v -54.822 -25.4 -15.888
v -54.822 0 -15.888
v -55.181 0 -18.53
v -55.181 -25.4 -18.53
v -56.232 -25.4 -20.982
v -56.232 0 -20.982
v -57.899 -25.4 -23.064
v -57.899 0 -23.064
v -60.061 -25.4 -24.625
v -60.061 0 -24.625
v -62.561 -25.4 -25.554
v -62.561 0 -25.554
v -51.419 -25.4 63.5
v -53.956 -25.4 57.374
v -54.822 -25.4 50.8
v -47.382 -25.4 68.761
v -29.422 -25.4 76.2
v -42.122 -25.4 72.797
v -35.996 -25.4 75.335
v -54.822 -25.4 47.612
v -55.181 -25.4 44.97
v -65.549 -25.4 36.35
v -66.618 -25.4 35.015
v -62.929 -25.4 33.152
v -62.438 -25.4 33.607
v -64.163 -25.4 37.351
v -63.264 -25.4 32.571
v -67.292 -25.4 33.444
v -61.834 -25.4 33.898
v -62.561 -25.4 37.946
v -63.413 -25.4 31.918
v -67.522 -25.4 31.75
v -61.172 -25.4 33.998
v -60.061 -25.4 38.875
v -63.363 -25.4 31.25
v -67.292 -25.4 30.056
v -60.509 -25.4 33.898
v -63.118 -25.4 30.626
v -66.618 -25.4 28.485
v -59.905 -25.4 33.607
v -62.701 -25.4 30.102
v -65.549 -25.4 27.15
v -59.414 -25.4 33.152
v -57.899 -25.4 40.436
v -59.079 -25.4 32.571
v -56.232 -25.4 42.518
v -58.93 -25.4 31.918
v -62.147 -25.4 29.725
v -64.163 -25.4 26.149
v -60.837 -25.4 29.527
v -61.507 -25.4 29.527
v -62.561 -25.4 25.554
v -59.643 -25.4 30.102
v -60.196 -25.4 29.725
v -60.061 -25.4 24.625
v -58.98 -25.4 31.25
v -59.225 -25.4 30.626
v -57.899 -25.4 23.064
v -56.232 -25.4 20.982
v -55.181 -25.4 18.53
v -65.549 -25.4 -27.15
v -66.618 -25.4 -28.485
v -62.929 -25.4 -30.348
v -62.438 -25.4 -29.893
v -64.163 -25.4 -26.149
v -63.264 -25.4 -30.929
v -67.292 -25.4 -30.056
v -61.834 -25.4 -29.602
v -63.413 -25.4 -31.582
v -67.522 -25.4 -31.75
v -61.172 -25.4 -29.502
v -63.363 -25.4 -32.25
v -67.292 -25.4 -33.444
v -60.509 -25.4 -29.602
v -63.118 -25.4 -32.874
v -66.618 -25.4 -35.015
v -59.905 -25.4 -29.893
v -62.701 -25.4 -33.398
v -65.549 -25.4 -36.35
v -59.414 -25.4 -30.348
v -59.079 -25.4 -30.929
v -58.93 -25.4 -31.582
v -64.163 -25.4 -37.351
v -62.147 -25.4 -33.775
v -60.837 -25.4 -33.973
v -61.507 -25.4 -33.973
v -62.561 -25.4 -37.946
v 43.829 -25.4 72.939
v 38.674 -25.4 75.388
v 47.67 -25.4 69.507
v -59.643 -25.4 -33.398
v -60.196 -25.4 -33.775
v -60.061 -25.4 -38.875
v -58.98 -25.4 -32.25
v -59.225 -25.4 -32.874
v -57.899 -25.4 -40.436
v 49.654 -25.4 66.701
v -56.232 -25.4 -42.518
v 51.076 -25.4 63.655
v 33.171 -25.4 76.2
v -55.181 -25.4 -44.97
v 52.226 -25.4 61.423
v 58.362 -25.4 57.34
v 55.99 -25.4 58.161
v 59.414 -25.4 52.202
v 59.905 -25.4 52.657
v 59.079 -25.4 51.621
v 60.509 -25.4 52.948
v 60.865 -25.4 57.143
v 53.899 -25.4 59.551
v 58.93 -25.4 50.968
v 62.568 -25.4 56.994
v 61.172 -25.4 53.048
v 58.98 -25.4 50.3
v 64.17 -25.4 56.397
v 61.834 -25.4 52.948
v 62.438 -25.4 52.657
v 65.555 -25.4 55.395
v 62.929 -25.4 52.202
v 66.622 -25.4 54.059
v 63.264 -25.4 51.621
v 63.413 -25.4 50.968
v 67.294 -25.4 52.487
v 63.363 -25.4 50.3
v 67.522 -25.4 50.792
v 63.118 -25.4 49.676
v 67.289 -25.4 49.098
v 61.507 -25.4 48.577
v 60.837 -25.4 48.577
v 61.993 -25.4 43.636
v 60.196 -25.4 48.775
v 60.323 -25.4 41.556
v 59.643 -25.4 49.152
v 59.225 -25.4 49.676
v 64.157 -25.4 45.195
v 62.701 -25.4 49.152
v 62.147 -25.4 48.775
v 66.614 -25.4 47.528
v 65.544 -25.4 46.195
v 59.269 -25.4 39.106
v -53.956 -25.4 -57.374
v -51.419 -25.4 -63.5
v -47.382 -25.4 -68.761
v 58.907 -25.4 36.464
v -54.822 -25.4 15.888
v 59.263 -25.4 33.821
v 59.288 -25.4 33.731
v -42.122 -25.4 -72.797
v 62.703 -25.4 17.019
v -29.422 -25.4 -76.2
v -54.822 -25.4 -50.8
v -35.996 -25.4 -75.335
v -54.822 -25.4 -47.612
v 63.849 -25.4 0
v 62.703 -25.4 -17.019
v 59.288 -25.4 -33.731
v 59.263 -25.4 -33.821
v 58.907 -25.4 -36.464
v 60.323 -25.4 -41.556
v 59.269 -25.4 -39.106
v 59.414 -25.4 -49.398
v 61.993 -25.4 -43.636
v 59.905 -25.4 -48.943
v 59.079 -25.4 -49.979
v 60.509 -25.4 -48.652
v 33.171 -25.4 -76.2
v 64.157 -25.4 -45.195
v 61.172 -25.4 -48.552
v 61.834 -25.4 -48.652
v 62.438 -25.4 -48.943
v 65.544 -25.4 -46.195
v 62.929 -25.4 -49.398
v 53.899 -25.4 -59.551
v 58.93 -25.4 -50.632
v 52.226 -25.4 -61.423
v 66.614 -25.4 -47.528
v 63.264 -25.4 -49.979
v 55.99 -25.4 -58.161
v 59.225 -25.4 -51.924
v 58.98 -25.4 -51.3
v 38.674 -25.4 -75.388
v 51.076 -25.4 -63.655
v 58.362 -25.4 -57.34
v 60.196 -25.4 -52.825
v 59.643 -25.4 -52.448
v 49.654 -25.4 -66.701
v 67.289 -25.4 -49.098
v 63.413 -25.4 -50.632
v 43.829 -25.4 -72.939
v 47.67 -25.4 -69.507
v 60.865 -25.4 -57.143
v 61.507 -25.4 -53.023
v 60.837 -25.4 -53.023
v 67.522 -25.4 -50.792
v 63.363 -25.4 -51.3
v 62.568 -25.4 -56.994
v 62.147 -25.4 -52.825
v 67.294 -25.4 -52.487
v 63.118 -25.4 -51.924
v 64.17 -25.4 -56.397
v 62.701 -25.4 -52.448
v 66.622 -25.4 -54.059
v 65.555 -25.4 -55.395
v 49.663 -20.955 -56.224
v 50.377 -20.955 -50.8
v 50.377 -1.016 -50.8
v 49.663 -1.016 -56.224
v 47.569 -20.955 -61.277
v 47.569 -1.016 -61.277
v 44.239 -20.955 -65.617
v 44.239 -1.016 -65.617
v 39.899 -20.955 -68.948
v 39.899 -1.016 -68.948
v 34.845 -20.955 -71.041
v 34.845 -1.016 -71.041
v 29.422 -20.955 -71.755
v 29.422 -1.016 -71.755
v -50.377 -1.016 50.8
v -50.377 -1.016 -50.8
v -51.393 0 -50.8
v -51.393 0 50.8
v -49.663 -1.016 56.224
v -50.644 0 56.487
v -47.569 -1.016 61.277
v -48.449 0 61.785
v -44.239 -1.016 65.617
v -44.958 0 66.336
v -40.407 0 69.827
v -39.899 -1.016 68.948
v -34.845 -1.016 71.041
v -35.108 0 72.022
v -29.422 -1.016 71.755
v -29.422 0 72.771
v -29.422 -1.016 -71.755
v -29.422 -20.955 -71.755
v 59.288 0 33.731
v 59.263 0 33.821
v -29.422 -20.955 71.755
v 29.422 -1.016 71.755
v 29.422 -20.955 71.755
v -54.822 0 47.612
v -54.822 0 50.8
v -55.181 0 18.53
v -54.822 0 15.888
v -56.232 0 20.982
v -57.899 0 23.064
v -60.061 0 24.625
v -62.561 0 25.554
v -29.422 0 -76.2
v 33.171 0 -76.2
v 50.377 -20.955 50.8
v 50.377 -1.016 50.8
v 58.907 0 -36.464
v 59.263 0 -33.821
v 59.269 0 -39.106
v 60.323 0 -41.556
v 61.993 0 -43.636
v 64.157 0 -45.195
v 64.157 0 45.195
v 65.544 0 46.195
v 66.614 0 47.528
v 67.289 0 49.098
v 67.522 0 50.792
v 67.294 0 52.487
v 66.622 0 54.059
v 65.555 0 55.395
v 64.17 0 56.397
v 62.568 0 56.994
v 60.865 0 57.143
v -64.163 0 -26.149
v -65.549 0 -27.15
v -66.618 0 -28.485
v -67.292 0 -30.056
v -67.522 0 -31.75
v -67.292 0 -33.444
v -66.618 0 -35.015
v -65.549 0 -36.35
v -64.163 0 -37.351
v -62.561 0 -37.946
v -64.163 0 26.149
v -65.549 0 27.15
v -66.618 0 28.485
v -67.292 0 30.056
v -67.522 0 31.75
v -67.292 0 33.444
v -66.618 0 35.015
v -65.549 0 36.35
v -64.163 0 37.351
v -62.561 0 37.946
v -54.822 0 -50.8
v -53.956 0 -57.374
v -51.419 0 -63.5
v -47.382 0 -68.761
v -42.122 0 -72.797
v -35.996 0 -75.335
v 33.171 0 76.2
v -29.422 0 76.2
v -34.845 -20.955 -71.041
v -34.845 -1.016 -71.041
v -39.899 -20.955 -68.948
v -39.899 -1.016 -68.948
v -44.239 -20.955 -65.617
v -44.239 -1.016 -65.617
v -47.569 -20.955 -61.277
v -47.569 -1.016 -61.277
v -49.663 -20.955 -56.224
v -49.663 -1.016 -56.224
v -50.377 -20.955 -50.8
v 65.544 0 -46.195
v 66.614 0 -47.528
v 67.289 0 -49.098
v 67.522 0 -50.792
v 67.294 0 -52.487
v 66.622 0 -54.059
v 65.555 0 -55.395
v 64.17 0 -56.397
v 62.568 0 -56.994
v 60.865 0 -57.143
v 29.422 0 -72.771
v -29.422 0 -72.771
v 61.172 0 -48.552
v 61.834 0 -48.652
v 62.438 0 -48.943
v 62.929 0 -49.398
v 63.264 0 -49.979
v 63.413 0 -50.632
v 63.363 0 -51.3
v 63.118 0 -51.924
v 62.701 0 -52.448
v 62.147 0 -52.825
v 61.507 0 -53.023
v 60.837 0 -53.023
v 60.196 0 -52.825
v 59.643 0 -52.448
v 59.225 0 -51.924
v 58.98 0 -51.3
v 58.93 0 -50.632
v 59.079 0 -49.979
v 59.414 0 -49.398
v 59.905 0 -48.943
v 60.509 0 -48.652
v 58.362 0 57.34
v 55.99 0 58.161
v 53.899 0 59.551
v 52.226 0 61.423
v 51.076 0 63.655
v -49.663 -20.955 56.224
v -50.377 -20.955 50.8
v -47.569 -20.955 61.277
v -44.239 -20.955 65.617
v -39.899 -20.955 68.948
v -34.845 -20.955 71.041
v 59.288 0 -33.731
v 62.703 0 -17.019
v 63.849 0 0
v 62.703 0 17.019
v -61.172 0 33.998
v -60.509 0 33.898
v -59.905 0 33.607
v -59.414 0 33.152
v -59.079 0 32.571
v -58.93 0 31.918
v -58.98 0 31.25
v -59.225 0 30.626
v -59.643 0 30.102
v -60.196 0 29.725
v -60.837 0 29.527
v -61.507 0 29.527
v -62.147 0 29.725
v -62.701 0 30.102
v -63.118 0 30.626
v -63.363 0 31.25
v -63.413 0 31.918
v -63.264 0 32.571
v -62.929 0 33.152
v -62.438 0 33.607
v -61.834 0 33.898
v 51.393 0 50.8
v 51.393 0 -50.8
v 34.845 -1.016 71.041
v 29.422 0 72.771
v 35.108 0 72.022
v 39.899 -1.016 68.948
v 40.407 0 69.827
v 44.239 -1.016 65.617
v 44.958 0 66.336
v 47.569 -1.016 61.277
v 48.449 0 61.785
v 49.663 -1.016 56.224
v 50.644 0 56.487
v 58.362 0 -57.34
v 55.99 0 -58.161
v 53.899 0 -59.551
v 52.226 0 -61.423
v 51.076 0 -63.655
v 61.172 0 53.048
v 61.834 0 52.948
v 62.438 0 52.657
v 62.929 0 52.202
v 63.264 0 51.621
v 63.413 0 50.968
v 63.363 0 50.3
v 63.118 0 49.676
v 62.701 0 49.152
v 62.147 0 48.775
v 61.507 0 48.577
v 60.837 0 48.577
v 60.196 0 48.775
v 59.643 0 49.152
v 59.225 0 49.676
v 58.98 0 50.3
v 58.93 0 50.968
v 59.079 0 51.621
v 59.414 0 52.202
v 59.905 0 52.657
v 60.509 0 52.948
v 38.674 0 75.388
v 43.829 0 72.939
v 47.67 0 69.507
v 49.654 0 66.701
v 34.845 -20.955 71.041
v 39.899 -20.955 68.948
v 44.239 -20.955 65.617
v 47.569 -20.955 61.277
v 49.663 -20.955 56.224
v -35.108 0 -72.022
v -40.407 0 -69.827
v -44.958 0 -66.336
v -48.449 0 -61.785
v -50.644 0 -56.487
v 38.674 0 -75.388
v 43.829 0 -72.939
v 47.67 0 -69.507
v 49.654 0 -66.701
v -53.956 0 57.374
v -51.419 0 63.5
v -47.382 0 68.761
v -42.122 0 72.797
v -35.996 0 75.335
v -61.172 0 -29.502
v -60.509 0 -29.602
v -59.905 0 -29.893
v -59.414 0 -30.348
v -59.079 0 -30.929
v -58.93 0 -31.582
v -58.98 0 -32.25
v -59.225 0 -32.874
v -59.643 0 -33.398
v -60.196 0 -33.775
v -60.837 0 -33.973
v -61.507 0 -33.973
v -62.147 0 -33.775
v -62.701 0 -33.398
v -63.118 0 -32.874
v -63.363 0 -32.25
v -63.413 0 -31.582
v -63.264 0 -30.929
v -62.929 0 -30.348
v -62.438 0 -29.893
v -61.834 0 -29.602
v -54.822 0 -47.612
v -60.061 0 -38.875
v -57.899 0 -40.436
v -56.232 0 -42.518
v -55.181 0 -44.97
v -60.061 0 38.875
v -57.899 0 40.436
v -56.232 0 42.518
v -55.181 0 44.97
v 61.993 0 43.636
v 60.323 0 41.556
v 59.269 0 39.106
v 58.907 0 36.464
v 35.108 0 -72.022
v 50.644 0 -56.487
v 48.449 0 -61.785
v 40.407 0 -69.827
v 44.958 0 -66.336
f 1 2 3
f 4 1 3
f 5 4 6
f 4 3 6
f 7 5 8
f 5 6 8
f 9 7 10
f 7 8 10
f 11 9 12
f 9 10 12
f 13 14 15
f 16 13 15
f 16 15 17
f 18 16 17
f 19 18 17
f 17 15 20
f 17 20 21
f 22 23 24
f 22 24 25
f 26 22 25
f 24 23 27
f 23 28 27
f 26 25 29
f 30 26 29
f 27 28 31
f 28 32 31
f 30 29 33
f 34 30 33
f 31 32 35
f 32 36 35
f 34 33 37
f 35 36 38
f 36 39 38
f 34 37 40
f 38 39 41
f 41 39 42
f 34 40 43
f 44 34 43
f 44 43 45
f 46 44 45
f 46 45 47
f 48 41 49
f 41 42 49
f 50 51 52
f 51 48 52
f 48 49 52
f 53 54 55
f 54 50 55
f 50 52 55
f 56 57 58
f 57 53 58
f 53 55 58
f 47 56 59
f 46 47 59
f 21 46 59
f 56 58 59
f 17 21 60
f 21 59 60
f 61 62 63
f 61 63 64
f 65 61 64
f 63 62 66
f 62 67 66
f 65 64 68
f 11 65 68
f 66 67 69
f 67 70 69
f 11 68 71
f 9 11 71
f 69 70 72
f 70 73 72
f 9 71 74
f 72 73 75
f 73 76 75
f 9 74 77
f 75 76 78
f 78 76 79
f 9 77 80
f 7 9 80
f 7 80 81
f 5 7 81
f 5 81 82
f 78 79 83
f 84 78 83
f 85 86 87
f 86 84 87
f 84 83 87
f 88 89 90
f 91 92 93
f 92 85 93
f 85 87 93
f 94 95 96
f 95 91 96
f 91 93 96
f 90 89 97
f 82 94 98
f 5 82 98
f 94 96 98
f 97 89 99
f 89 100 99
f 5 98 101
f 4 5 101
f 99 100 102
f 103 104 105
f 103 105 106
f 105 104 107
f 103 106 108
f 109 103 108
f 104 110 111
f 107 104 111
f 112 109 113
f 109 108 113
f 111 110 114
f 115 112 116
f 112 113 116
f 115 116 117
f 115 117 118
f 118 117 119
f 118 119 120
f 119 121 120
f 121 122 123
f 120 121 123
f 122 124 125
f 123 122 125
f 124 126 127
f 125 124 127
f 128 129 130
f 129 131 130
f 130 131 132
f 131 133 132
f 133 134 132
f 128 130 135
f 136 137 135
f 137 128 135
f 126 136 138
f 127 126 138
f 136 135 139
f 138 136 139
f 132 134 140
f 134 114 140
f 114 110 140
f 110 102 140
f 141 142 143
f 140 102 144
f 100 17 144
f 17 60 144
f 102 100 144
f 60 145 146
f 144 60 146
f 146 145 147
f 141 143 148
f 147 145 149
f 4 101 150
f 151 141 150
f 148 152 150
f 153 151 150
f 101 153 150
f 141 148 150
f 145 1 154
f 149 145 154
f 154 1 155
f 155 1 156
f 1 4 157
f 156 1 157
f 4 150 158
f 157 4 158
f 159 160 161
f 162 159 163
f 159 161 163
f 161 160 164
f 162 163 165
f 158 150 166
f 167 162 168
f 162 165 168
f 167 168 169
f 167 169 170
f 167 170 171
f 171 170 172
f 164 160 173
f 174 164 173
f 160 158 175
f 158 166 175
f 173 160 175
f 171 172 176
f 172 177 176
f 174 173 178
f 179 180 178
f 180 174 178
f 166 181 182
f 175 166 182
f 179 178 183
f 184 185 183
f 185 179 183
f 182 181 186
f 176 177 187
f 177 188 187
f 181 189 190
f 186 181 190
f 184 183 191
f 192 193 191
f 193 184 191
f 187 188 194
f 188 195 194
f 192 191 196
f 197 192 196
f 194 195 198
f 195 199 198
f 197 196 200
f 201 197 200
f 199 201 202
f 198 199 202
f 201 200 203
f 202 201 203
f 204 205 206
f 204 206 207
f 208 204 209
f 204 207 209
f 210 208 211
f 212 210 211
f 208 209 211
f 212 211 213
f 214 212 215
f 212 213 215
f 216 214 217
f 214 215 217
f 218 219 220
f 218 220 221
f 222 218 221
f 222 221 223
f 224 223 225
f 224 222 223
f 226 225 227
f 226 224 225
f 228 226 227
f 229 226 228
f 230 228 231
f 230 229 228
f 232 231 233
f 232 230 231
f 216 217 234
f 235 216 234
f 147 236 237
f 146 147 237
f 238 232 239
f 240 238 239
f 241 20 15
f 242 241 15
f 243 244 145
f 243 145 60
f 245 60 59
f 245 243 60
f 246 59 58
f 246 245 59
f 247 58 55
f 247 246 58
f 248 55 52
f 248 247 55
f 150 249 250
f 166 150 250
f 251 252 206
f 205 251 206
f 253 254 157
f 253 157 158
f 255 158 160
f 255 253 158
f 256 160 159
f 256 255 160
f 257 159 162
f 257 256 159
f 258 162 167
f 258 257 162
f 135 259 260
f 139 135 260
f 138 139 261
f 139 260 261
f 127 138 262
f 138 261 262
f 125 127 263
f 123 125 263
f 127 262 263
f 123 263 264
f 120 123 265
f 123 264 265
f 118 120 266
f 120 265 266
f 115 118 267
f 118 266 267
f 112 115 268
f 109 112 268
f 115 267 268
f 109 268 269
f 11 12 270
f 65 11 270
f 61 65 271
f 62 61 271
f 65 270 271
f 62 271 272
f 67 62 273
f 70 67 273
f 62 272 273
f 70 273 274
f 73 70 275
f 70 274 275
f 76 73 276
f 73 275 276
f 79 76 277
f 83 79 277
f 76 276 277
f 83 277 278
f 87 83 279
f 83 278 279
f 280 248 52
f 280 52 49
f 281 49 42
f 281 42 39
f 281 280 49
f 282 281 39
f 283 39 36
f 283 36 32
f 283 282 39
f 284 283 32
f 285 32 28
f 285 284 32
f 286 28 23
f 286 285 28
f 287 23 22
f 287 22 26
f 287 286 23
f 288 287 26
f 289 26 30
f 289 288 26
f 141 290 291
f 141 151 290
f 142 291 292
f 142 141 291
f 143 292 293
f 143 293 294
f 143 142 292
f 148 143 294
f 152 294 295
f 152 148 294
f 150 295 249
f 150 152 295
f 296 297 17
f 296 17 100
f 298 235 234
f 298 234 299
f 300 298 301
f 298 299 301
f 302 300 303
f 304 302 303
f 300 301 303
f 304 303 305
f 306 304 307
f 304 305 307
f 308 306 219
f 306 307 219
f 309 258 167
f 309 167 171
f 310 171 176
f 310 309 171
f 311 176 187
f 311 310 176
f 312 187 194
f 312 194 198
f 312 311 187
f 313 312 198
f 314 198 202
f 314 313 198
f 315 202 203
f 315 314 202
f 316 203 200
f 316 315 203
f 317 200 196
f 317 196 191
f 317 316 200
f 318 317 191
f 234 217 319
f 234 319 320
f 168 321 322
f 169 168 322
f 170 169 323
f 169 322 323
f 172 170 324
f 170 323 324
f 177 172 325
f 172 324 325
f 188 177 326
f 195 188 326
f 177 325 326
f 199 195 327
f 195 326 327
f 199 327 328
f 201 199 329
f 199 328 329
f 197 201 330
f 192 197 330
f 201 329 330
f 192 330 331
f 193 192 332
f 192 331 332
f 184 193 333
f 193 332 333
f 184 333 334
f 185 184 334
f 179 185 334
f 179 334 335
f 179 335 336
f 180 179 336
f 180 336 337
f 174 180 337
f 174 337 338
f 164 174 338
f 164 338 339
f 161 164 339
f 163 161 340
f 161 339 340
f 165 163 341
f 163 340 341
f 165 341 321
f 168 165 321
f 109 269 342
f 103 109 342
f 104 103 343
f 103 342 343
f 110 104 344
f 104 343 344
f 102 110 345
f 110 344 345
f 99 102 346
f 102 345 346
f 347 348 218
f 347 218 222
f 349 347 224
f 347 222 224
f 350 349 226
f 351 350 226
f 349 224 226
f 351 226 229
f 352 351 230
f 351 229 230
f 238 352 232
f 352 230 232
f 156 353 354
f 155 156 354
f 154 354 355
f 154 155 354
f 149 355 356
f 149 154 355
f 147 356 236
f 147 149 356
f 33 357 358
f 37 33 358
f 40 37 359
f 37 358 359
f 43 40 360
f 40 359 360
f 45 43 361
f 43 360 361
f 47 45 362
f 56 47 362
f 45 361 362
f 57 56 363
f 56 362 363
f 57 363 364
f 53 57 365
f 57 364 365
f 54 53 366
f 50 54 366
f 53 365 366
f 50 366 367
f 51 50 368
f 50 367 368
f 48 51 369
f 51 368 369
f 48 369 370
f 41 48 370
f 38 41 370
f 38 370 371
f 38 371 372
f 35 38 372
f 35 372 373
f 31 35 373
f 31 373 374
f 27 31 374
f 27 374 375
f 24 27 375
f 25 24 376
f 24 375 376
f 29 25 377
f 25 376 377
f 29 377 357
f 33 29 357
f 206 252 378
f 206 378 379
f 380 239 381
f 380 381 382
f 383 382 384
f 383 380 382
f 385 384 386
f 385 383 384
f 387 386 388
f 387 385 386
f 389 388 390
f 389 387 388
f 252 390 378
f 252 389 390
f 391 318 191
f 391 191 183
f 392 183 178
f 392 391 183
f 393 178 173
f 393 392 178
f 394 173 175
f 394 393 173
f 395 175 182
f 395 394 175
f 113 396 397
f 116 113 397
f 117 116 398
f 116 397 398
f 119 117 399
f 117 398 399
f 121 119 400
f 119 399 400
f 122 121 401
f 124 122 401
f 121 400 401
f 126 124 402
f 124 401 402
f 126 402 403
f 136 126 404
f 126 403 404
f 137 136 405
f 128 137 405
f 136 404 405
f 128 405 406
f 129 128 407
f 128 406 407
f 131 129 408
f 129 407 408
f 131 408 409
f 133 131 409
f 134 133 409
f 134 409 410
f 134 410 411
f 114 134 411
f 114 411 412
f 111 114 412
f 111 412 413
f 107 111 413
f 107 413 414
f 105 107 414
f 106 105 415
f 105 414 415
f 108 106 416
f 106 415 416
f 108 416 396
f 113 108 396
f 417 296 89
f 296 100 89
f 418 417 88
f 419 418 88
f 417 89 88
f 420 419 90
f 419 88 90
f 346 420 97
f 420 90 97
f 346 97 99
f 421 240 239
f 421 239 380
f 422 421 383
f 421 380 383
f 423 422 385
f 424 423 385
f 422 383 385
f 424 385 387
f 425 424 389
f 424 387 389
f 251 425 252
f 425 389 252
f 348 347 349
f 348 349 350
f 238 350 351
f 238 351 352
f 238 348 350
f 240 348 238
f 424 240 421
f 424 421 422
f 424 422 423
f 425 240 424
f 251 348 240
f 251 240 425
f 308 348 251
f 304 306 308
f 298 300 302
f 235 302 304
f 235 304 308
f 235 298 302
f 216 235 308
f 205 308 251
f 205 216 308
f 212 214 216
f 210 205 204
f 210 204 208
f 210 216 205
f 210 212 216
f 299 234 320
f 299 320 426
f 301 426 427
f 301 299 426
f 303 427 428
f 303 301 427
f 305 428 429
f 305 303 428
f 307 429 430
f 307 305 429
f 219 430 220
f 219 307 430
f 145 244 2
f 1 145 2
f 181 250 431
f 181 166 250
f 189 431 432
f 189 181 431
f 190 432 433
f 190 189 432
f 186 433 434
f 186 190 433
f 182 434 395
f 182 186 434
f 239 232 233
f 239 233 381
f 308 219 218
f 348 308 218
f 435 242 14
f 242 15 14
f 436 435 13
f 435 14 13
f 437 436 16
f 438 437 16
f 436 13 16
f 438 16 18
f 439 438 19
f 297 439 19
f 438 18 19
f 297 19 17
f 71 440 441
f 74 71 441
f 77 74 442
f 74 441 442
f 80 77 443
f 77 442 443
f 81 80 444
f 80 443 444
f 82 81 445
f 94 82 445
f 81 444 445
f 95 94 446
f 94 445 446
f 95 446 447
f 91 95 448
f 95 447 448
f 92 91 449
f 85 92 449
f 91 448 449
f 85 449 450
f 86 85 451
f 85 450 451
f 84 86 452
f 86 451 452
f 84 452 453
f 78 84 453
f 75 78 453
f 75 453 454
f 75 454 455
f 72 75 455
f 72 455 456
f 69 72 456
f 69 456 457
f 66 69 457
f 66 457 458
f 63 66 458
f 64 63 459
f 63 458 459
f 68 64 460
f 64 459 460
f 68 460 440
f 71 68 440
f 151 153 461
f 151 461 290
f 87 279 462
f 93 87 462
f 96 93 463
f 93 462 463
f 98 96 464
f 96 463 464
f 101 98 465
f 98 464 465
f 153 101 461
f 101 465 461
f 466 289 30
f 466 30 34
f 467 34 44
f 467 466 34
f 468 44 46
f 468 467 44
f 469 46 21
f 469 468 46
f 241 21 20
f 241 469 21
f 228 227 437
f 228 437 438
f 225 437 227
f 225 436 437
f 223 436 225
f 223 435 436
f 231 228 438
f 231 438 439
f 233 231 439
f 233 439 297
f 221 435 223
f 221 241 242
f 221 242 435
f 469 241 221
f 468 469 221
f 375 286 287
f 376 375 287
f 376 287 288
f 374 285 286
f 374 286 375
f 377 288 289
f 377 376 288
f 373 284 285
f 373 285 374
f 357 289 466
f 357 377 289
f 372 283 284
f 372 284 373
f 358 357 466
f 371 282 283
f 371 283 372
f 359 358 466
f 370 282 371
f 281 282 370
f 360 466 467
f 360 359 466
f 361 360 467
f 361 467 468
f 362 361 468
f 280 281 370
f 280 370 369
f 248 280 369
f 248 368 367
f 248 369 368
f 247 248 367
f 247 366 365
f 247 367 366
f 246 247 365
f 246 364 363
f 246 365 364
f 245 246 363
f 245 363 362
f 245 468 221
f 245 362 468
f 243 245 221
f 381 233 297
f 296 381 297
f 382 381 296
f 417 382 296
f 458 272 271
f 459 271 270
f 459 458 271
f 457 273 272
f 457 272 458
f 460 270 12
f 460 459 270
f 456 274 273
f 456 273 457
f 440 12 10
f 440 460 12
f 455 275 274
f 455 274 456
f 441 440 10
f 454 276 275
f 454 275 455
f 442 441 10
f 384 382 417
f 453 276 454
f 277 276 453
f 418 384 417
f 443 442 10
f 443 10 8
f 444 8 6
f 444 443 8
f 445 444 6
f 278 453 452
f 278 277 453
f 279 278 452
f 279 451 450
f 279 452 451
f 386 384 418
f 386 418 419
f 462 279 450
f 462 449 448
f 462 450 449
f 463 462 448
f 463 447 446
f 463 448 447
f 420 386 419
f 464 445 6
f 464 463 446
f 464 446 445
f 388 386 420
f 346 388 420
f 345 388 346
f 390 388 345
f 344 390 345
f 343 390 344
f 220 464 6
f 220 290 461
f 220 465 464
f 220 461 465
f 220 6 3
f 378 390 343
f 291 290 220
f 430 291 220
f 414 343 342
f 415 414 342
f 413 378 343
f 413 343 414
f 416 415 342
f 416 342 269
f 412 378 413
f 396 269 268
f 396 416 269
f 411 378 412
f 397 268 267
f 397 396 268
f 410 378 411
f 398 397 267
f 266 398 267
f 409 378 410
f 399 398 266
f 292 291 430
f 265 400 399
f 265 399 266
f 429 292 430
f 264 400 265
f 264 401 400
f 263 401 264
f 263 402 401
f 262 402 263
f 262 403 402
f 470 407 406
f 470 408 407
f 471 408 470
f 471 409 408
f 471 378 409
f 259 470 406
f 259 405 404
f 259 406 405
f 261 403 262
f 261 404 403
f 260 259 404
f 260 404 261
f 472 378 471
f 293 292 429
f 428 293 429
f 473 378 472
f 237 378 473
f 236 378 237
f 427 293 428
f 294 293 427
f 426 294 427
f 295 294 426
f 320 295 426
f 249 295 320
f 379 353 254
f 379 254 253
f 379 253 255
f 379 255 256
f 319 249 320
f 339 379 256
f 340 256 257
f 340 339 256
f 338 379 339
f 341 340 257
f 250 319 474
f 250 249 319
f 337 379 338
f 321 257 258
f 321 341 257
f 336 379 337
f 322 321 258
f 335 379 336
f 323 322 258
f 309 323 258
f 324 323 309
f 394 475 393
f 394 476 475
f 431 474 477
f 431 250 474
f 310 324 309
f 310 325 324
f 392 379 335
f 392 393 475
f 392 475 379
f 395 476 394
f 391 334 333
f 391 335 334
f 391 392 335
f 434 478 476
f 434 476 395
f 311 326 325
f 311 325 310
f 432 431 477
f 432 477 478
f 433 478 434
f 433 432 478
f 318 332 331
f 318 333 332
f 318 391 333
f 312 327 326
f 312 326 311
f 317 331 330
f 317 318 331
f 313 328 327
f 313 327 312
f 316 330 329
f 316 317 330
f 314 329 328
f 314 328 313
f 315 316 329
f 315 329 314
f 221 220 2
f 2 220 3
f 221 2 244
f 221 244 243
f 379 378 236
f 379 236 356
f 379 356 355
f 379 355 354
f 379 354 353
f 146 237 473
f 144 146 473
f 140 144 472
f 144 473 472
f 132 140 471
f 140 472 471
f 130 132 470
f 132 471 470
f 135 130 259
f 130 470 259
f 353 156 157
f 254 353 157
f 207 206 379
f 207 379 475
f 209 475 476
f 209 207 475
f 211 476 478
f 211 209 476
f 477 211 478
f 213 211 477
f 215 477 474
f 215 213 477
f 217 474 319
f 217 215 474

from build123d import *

# Parameters (mm, degrees)
SKETCH1_W           = 137.16
SKETCH1_H           = 152.4
BOSS_EXTRUDE2_DEPTH = 25.4
CUT_EXTRUDE1_DEPTH  = 25.4
SKETCH2_R           = 2.2479
CUT_EXTRUDE2_DEPTH  = 25.4
FILLET2_R           = 25.4
FILLET3_R           = 19.05
FILLET4_R           = 127
CUT_EXTRUDE3_DEPTH  = 20.955
CHAMFER1_SIZE       = 1.016


with BuildPart() as part:
    # Sketch1 → Boss-Extrude2 (new body)
    with BuildSketch(Plane(origin=(0, 0, 0), x_dir=(1, 0, 0), z_dir=(0, 1, 0))):
        Rectangle(SKETCH1_W, SKETCH1_H)
    extrude(amount=-BOSS_EXTRUDE2_DEPTH)

    # Sketch3 → Cut-Extrude1 (cut)
    with BuildSketch(Plane(origin=(0, 0, 0), x_dir=(1, 0, 0), z_dir=(0, 1, 0))):
        with BuildLine():
            Line((68.58, 0), (59.262686671, -33.820874717))
            ThreePointArc((59.262686671, -33.820874717), (59.713399713, -40.366937171), (64.156526503, -45.195259885))
            ThreePointArc((64.156526503, -45.195259885), (67.293603318, -52.486532428), (60.865154116, -57.142598053))
            ThreePointArc((60.865154116, -57.142598053), (54.576224637, -59.014346409), (50.836773359, -64.406060426))
            Line((50.836773359, -64.406060426), (47.587660753, -76.2))
            Line((47.587660753, -76.2), (68.58, -76.2))
            Line((68.58, -76.2), (68.58, 0))
        make_face()
        with BuildLine():
            Line((-54.821666667, -47.612294916), (-54.821666667, -76.2))
            Line((-54.821666667, -76.2), (-68.58, -76.2))
            Line((-68.58, -76.2), (-68.58, 0))
            Line((-68.58, 0), (-54.821666667, 0))
            Line((-54.821666667, 0), (-54.821666667, -15.887705084))
            ThreePointArc((-54.821666667, -15.887705084), (-56.994797895, -22.078955084), (-62.560729167, -25.553791048))
            ThreePointArc((-62.560729167, -25.553791048), (-67.521666667, -31.75), (-62.560729167, -37.946208952))
            ThreePointArc((-62.560729167, -37.946208952), (-56.994797895, -41.421044916), (-54.821666667, -47.612294916))
        make_face()
    cut_extrude1 = extrude(amount=-CUT_EXTRUDE1_DEPTH, mode=Mode.SUBTRACT)

    # Mirror1: Cut-Extrude1 across plane
    add(cut_extrude1.mirror(Plane(origin=(-54.821666667, -104.438713977, 0), x_dir=(1, 0, 0), z_dir=(0, 0, -1))), mode=Mode.SUBTRACT)

    # Sketch2 → Cut-Extrude2 (cut)
    with BuildSketch(Plane(origin=(0, 0, 0), x_dir=(1, 0, 0), z_dir=(0, 1, 0))):
        with Locations(Location((-61.171666667, 31.75, 0), (0, 0, 270))):
            Circle(SKETCH2_R)
        with Locations(Location((-61.171666667, -31.75, 0), (0, 0, 270))):
            Circle(SKETCH2_R)
        with Locations(Location((61.171666667, 50.8, 0), (0, 0, 270))):
            Circle(SKETCH2_R)
        with Locations(Location((61.171666667, -50.8, 0), (0, 0, 270))):
            Circle(SKETCH2_R)
    extrude(amount=-CUT_EXTRUDE2_DEPTH, mode=Mode.SUBTRACT)

    # Fillet2
    fillet2_edges = [part.edges().sort_by_distance(p)[0] for p in [
        (-54.821666667, -12.7, 76.2),
        (-54.821666667, -12.7, -76.2),
    ]]
    fillet(fillet2_edges, radius=FILLET2_R)

    # Fillet3
    fillet3_edges = [part.edges().sort_by_distance(p)[0] for p in [
        (47.587660753, -12.7, 76.2),
        (47.587660753, -12.7, -76.2),
    ]]
    fillet(fillet3_edges, radius=FILLET3_R)

    # Fillet4
    fillet4_edges = [part.edges().sort_by_distance(p)[0] for p in [
        (68.58, -12.7, 0),
    ]]
    fillet(fillet4_edges, radius=FILLET4_R)

    # Sketch4 → Cut-Extrude3 (cut)
    with BuildSketch(Plane(origin=(0, 0, 0), x_dir=(1, 0, 0), z_dir=(0, 1, 0))):
        with BuildLine():
            Line((-50.376666667, 50.8), (-50.376666667, -50.8))
            ThreePointArc((-50.376666667, -50.8), (-44.239089266, -65.6174226), (-29.421666667, -71.755))
            Line((-29.421666667, -71.755), (29.421666667, -71.755))
            ThreePointArc((29.421666667, -71.755), (44.239089266, -65.6174226), (50.376666667, -50.8))
            Line((50.376666667, -50.8), (50.376666667, 50.8))
            ThreePointArc((50.376666667, 50.8), (44.239089266, 65.6174226), (29.421666667, 71.755))
            Line((29.421666667, 71.755), (-29.421666667, 71.755))
            ThreePointArc((-29.421666667, 71.755), (-44.239089266, 65.6174226), (-50.376666667, 50.8))
        make_face()
    extrude(amount=-CUT_EXTRUDE3_DEPTH, mode=Mode.SUBTRACT)

    # Chamfer1
    chamfer1_edges = [part.edges().sort_by_distance(p)[0] for p in [
        (44.239089266, 0, 65.6174226),
        (50.376666667, 0, 0),
        (44.239089266, 0, -65.6174226),
        (0, 0, -71.755),
        (-44.239089266, 0, -65.6174226),
        (-50.376666667, 0, 0),
        (-44.239089266, 0, 65.6174226),
        (0, 0, 71.755),
    ]]
    chamfer(chamfer1_edges, length=CHAMFER1_SIZE)


solid = part.part
